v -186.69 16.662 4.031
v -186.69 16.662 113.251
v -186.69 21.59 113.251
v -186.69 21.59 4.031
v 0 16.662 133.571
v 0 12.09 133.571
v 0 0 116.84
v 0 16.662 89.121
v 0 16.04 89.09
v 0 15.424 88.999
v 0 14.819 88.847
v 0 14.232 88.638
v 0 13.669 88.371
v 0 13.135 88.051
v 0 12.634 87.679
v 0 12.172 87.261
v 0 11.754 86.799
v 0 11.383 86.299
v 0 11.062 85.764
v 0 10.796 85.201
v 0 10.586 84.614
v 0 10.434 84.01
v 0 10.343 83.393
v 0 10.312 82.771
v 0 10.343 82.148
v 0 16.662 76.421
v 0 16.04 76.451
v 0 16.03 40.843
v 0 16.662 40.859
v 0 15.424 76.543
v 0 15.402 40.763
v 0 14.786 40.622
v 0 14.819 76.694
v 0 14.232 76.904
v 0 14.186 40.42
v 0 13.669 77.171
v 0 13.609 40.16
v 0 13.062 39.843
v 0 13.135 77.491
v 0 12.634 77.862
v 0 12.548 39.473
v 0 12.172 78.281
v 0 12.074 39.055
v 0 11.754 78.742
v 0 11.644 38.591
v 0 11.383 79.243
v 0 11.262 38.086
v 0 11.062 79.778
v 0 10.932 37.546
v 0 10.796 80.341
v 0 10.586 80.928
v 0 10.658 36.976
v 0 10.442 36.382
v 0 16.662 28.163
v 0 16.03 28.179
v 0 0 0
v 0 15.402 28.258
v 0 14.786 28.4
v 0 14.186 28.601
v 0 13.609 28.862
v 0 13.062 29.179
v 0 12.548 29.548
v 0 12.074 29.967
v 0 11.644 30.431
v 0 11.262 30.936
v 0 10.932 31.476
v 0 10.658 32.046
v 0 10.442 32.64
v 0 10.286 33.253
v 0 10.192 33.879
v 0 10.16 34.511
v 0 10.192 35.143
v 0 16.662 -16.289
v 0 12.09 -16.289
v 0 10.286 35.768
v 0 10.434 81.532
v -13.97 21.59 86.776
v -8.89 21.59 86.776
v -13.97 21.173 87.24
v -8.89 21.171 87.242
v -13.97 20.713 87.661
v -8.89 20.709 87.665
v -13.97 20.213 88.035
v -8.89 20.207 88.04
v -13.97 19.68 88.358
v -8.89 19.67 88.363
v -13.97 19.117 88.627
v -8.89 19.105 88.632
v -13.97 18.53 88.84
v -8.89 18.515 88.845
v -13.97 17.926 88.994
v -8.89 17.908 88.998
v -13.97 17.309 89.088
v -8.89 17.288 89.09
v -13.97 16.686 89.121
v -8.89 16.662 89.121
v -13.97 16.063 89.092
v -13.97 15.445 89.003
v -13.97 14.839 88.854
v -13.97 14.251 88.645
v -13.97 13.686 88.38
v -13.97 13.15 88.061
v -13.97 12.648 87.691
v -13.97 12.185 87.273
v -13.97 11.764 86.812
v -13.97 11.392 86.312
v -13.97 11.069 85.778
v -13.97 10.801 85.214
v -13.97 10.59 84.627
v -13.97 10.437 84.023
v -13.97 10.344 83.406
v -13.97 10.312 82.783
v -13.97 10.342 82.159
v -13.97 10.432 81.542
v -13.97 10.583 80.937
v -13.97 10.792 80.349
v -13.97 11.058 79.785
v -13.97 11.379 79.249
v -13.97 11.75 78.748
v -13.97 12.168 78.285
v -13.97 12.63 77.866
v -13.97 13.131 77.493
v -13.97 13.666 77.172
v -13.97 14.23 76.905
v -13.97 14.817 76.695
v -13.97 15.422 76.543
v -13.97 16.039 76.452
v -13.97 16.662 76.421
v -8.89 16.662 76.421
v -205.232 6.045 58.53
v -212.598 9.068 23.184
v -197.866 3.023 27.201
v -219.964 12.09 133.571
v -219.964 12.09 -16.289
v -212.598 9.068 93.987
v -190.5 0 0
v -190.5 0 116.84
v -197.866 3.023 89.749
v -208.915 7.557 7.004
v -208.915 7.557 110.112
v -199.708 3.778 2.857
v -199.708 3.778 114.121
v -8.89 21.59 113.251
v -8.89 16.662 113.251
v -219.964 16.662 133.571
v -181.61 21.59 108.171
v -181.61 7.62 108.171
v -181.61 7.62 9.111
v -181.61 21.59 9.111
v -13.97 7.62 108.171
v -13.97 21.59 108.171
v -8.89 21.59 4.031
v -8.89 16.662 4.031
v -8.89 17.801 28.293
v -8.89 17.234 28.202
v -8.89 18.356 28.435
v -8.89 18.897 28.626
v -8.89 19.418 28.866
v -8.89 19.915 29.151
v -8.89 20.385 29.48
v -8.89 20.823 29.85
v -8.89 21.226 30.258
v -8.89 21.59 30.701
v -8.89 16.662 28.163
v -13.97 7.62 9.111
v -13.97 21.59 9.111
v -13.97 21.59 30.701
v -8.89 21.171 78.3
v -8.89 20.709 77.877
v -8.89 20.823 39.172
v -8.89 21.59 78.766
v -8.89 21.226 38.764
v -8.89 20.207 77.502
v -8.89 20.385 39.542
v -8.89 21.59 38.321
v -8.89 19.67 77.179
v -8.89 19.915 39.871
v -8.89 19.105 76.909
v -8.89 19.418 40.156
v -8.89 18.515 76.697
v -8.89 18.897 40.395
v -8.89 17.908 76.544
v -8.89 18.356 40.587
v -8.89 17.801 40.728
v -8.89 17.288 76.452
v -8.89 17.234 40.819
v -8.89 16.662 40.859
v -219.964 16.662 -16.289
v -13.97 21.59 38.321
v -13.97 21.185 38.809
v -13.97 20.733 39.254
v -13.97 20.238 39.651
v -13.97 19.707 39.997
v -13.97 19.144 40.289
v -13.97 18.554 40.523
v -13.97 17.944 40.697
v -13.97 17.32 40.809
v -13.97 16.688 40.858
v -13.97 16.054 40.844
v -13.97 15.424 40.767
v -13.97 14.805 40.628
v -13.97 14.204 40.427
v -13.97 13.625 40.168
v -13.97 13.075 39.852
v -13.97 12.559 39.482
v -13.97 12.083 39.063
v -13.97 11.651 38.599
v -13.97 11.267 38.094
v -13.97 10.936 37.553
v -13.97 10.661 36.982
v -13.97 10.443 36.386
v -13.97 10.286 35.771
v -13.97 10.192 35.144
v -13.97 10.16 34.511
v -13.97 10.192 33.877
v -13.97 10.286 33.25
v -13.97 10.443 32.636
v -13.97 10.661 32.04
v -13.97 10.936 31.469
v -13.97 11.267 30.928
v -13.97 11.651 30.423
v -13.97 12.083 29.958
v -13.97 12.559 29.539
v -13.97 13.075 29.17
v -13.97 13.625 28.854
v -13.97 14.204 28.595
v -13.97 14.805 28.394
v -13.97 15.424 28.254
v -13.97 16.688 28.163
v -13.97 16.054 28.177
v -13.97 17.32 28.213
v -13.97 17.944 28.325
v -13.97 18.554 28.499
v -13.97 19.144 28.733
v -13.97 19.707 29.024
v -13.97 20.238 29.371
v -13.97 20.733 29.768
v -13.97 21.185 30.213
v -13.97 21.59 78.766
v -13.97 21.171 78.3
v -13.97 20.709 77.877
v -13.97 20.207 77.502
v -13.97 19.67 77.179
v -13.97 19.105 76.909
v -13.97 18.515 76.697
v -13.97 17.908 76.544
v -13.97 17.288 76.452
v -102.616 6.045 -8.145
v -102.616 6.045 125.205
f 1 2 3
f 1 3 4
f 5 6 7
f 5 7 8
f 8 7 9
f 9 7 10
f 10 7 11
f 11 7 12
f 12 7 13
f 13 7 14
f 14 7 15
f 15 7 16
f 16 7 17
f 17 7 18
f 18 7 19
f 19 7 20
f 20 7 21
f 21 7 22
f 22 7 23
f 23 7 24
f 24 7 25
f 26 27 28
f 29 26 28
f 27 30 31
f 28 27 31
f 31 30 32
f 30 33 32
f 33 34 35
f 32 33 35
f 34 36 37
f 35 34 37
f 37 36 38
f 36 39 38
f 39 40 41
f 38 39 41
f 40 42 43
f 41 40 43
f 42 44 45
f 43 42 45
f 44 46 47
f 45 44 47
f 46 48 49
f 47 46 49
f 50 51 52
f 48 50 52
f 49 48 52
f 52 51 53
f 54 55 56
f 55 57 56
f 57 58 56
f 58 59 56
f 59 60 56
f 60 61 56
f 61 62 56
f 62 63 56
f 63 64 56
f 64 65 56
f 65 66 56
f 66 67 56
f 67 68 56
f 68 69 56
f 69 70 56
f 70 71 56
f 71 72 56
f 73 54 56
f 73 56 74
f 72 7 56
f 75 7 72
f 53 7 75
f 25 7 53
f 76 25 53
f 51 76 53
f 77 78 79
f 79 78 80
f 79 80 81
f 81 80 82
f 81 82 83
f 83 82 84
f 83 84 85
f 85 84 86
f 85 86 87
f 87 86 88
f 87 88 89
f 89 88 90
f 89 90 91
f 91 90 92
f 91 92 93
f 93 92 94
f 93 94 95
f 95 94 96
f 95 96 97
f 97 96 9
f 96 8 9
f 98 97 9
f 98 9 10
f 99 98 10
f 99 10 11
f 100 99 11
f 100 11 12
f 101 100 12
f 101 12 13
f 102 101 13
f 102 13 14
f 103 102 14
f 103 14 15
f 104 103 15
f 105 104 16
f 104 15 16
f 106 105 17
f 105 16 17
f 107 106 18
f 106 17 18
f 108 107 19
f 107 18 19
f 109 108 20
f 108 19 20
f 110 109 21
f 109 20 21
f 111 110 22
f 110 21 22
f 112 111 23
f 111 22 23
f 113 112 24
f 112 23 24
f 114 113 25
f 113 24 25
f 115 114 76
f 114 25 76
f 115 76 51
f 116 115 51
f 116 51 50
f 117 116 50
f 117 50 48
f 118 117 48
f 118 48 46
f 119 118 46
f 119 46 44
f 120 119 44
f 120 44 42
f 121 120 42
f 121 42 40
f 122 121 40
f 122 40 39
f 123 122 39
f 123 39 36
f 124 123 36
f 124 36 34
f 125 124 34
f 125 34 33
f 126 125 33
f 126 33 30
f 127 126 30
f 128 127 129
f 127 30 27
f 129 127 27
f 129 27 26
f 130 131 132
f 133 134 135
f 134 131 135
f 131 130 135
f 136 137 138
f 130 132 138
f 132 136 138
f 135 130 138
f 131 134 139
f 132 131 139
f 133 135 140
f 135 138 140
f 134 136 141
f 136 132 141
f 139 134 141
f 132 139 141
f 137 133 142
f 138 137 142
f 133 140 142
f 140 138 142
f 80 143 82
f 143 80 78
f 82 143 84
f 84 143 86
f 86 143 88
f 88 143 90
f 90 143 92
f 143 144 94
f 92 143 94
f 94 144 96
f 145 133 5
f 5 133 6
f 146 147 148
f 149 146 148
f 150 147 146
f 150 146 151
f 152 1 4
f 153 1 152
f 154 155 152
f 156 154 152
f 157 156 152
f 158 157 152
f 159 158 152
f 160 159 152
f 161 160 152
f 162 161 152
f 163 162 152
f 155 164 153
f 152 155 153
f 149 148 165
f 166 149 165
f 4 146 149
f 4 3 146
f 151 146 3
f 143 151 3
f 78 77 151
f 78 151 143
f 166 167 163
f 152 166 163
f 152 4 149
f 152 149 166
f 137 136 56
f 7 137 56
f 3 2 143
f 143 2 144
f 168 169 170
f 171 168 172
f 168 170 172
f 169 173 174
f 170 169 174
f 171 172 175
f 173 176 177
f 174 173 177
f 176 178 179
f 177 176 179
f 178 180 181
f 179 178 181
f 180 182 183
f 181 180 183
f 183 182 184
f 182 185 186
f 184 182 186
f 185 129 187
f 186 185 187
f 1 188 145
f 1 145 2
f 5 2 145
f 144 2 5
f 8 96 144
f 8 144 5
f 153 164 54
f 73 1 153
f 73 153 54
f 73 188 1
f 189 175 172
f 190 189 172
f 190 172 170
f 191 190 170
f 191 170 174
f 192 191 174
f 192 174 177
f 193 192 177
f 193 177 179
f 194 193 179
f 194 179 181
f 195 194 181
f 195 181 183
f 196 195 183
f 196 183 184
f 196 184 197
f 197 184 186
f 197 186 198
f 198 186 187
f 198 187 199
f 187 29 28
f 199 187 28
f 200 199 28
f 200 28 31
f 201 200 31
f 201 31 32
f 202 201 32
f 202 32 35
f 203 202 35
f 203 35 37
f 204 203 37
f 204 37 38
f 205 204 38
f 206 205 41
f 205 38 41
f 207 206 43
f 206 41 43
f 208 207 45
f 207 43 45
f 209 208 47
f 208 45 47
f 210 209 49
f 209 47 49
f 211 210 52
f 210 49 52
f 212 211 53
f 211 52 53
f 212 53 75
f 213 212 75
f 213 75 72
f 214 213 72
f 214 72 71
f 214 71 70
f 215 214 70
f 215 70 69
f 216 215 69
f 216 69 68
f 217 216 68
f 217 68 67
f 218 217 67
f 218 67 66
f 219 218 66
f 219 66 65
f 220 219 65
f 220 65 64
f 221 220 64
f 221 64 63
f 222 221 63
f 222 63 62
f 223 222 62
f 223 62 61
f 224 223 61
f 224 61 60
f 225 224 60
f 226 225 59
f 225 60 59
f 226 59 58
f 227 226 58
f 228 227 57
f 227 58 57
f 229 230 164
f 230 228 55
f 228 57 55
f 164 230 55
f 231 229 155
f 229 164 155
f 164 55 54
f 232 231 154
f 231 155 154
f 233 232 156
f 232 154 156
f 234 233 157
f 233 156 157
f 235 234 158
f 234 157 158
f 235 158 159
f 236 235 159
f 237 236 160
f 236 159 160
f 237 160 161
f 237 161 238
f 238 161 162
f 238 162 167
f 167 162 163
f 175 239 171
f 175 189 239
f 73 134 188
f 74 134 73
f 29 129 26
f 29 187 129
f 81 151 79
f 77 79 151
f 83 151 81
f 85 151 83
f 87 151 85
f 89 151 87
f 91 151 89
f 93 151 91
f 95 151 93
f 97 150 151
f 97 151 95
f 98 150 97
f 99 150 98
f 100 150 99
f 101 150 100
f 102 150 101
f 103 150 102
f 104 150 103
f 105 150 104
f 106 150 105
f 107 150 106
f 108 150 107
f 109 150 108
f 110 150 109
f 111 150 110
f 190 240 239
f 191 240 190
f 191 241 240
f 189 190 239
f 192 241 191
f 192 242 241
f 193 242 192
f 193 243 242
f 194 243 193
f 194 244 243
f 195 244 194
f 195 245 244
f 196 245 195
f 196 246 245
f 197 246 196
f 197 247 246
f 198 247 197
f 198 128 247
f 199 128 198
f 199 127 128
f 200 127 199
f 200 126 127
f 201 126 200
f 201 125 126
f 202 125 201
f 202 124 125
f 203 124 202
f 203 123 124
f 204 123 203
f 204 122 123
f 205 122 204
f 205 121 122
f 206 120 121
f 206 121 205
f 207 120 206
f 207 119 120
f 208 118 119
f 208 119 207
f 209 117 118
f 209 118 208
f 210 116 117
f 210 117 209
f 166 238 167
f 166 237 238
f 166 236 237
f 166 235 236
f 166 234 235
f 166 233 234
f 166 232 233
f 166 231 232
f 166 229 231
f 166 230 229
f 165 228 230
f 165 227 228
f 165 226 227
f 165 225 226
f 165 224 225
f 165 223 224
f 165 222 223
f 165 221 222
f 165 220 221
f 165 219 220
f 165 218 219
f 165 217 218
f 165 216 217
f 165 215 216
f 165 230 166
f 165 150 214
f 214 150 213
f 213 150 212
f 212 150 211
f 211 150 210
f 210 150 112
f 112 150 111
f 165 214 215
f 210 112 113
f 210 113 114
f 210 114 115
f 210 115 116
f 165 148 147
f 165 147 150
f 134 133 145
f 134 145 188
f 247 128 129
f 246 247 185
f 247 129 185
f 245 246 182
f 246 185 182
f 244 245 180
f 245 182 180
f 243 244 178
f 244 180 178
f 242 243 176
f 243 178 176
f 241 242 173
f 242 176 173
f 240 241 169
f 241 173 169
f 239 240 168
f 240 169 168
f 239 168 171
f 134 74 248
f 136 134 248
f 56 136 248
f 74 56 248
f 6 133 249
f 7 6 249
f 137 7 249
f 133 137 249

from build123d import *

# Parameters (mm, degrees)
SKETCH2_2_W         = 219.964
SKETCH2_2_H         = 149.86
BOSS_EXTRUDE2_DEPTH = 4.572
SKETCH3_W           = 177.8
SKETCH3_H           = 109.22
BOSS_EXTRUDE3_DEPTH = 5.08
SKETCH4_W           = 167.64
SKETCH4_H           = 99.06
CUT_EXTRUDE1_DEPTH  = 258.8719036
SKETCH4_2_W         = 167.64
SKETCH4_2_H         = 99.06
CUT_EXTRUDE2_DEPTH  = 8.89
SKETCH5_R           = 6.35
CUT_EXTRUDE3_DEPTH  = 19.05


with BuildPart() as part:
    # Sketch2 → Loft1 section 0
    with BuildSketch(Plane(origin=(0, 12.0904, 0), x_dir=(1, 0, 0), z_dir=(0, 1, 0))):
        with BuildLine():
            Line((-219.964, 16.289130435), (0, 16.289130435))
            Line((0, 16.289130435), (0, -133.570869565))
            Line((0, -133.570869565), (-219.964, -133.570869565))
            Line((-219.964, -133.570869565), (-219.964, 16.289130435))
        make_face()
    # Sketch1 → Loft1 section 1
    with BuildSketch(Plane(origin=(0, 0, 0), x_dir=(1, 0, 0), z_dir=(0, 1, 0))):
        with BuildLine():
            Line((-190.5, 0), (0, 0))
            Line((0, 0), (0, -116.84))
            Line((0, -116.84), (-190.5, -116.84))
            Line((-190.5, -116.84), (-190.5, 0))
        make_face()
    loft()

    # Sketch2<2> → Boss-Extrude2 (add)
    with BuildSketch(Plane(origin=(0, 12.0904, 0), x_dir=(1, 0, 0), z_dir=(0, 1, 0))):
        with Locations((-109.982, -58.640869565)):
            Rectangle(SKETCH2_2_W, SKETCH2_2_H)
    extrude(amount=BOSS_EXTRUDE2_DEPTH)

    # Sketch3 → Boss-Extrude3 (add)
    with BuildSketch(Plane(origin=(0, 16.51, 0), x_dir=(1, 0, 0), z_dir=(0, 1, 0))):
        with Locations((-97.79, -58.640869565)):
            Rectangle(SKETCH3_W, SKETCH3_H)
    extrude(amount=BOSS_EXTRUDE3_DEPTH)

    # Sketch4 → Cut-Extrude1 (cut, through all)
    with BuildSketch(Plane(origin=(0, 16.51, 0), x_dir=(1, 0, 0), z_dir=(0, 1, 0))):
        with Locations((-97.79, -58.640869565)):
            Rectangle(SKETCH4_W, SKETCH4_H)
    extrude(amount=CUT_EXTRUDE1_DEPTH, mode=Mode.SUBTRACT)

    # Sketch4<2> → Cut-Extrude2 (cut)
    with BuildSketch(Plane(origin=(0, 16.51, 0), x_dir=(1, 0, 0), z_dir=(0, 1, 0))):
        with Locations((-97.79, -58.640869565)):
            Rectangle(SKETCH4_2_W, SKETCH4_2_H)
    extrude(amount=-CUT_EXTRUDE2_DEPTH, mode=Mode.SUBTRACT)

    # Sketch5 → Cut-Extrude3 (cut)
    with BuildSketch(Plane(origin=(0, 0, 0), x_dir=(0, 0, -1), z_dir=(1, 0, 0))):
        with Locations((-82.770869565, 16.6624)):
            Circle(SKETCH5_R)
        with Locations((-34.510869565, 16.51)):
            Circle(SKETCH5_R)
    extrude(amount=-CUT_EXTRUDE3_DEPTH, mode=Mode.SUBTRACT)


solid = part.part
